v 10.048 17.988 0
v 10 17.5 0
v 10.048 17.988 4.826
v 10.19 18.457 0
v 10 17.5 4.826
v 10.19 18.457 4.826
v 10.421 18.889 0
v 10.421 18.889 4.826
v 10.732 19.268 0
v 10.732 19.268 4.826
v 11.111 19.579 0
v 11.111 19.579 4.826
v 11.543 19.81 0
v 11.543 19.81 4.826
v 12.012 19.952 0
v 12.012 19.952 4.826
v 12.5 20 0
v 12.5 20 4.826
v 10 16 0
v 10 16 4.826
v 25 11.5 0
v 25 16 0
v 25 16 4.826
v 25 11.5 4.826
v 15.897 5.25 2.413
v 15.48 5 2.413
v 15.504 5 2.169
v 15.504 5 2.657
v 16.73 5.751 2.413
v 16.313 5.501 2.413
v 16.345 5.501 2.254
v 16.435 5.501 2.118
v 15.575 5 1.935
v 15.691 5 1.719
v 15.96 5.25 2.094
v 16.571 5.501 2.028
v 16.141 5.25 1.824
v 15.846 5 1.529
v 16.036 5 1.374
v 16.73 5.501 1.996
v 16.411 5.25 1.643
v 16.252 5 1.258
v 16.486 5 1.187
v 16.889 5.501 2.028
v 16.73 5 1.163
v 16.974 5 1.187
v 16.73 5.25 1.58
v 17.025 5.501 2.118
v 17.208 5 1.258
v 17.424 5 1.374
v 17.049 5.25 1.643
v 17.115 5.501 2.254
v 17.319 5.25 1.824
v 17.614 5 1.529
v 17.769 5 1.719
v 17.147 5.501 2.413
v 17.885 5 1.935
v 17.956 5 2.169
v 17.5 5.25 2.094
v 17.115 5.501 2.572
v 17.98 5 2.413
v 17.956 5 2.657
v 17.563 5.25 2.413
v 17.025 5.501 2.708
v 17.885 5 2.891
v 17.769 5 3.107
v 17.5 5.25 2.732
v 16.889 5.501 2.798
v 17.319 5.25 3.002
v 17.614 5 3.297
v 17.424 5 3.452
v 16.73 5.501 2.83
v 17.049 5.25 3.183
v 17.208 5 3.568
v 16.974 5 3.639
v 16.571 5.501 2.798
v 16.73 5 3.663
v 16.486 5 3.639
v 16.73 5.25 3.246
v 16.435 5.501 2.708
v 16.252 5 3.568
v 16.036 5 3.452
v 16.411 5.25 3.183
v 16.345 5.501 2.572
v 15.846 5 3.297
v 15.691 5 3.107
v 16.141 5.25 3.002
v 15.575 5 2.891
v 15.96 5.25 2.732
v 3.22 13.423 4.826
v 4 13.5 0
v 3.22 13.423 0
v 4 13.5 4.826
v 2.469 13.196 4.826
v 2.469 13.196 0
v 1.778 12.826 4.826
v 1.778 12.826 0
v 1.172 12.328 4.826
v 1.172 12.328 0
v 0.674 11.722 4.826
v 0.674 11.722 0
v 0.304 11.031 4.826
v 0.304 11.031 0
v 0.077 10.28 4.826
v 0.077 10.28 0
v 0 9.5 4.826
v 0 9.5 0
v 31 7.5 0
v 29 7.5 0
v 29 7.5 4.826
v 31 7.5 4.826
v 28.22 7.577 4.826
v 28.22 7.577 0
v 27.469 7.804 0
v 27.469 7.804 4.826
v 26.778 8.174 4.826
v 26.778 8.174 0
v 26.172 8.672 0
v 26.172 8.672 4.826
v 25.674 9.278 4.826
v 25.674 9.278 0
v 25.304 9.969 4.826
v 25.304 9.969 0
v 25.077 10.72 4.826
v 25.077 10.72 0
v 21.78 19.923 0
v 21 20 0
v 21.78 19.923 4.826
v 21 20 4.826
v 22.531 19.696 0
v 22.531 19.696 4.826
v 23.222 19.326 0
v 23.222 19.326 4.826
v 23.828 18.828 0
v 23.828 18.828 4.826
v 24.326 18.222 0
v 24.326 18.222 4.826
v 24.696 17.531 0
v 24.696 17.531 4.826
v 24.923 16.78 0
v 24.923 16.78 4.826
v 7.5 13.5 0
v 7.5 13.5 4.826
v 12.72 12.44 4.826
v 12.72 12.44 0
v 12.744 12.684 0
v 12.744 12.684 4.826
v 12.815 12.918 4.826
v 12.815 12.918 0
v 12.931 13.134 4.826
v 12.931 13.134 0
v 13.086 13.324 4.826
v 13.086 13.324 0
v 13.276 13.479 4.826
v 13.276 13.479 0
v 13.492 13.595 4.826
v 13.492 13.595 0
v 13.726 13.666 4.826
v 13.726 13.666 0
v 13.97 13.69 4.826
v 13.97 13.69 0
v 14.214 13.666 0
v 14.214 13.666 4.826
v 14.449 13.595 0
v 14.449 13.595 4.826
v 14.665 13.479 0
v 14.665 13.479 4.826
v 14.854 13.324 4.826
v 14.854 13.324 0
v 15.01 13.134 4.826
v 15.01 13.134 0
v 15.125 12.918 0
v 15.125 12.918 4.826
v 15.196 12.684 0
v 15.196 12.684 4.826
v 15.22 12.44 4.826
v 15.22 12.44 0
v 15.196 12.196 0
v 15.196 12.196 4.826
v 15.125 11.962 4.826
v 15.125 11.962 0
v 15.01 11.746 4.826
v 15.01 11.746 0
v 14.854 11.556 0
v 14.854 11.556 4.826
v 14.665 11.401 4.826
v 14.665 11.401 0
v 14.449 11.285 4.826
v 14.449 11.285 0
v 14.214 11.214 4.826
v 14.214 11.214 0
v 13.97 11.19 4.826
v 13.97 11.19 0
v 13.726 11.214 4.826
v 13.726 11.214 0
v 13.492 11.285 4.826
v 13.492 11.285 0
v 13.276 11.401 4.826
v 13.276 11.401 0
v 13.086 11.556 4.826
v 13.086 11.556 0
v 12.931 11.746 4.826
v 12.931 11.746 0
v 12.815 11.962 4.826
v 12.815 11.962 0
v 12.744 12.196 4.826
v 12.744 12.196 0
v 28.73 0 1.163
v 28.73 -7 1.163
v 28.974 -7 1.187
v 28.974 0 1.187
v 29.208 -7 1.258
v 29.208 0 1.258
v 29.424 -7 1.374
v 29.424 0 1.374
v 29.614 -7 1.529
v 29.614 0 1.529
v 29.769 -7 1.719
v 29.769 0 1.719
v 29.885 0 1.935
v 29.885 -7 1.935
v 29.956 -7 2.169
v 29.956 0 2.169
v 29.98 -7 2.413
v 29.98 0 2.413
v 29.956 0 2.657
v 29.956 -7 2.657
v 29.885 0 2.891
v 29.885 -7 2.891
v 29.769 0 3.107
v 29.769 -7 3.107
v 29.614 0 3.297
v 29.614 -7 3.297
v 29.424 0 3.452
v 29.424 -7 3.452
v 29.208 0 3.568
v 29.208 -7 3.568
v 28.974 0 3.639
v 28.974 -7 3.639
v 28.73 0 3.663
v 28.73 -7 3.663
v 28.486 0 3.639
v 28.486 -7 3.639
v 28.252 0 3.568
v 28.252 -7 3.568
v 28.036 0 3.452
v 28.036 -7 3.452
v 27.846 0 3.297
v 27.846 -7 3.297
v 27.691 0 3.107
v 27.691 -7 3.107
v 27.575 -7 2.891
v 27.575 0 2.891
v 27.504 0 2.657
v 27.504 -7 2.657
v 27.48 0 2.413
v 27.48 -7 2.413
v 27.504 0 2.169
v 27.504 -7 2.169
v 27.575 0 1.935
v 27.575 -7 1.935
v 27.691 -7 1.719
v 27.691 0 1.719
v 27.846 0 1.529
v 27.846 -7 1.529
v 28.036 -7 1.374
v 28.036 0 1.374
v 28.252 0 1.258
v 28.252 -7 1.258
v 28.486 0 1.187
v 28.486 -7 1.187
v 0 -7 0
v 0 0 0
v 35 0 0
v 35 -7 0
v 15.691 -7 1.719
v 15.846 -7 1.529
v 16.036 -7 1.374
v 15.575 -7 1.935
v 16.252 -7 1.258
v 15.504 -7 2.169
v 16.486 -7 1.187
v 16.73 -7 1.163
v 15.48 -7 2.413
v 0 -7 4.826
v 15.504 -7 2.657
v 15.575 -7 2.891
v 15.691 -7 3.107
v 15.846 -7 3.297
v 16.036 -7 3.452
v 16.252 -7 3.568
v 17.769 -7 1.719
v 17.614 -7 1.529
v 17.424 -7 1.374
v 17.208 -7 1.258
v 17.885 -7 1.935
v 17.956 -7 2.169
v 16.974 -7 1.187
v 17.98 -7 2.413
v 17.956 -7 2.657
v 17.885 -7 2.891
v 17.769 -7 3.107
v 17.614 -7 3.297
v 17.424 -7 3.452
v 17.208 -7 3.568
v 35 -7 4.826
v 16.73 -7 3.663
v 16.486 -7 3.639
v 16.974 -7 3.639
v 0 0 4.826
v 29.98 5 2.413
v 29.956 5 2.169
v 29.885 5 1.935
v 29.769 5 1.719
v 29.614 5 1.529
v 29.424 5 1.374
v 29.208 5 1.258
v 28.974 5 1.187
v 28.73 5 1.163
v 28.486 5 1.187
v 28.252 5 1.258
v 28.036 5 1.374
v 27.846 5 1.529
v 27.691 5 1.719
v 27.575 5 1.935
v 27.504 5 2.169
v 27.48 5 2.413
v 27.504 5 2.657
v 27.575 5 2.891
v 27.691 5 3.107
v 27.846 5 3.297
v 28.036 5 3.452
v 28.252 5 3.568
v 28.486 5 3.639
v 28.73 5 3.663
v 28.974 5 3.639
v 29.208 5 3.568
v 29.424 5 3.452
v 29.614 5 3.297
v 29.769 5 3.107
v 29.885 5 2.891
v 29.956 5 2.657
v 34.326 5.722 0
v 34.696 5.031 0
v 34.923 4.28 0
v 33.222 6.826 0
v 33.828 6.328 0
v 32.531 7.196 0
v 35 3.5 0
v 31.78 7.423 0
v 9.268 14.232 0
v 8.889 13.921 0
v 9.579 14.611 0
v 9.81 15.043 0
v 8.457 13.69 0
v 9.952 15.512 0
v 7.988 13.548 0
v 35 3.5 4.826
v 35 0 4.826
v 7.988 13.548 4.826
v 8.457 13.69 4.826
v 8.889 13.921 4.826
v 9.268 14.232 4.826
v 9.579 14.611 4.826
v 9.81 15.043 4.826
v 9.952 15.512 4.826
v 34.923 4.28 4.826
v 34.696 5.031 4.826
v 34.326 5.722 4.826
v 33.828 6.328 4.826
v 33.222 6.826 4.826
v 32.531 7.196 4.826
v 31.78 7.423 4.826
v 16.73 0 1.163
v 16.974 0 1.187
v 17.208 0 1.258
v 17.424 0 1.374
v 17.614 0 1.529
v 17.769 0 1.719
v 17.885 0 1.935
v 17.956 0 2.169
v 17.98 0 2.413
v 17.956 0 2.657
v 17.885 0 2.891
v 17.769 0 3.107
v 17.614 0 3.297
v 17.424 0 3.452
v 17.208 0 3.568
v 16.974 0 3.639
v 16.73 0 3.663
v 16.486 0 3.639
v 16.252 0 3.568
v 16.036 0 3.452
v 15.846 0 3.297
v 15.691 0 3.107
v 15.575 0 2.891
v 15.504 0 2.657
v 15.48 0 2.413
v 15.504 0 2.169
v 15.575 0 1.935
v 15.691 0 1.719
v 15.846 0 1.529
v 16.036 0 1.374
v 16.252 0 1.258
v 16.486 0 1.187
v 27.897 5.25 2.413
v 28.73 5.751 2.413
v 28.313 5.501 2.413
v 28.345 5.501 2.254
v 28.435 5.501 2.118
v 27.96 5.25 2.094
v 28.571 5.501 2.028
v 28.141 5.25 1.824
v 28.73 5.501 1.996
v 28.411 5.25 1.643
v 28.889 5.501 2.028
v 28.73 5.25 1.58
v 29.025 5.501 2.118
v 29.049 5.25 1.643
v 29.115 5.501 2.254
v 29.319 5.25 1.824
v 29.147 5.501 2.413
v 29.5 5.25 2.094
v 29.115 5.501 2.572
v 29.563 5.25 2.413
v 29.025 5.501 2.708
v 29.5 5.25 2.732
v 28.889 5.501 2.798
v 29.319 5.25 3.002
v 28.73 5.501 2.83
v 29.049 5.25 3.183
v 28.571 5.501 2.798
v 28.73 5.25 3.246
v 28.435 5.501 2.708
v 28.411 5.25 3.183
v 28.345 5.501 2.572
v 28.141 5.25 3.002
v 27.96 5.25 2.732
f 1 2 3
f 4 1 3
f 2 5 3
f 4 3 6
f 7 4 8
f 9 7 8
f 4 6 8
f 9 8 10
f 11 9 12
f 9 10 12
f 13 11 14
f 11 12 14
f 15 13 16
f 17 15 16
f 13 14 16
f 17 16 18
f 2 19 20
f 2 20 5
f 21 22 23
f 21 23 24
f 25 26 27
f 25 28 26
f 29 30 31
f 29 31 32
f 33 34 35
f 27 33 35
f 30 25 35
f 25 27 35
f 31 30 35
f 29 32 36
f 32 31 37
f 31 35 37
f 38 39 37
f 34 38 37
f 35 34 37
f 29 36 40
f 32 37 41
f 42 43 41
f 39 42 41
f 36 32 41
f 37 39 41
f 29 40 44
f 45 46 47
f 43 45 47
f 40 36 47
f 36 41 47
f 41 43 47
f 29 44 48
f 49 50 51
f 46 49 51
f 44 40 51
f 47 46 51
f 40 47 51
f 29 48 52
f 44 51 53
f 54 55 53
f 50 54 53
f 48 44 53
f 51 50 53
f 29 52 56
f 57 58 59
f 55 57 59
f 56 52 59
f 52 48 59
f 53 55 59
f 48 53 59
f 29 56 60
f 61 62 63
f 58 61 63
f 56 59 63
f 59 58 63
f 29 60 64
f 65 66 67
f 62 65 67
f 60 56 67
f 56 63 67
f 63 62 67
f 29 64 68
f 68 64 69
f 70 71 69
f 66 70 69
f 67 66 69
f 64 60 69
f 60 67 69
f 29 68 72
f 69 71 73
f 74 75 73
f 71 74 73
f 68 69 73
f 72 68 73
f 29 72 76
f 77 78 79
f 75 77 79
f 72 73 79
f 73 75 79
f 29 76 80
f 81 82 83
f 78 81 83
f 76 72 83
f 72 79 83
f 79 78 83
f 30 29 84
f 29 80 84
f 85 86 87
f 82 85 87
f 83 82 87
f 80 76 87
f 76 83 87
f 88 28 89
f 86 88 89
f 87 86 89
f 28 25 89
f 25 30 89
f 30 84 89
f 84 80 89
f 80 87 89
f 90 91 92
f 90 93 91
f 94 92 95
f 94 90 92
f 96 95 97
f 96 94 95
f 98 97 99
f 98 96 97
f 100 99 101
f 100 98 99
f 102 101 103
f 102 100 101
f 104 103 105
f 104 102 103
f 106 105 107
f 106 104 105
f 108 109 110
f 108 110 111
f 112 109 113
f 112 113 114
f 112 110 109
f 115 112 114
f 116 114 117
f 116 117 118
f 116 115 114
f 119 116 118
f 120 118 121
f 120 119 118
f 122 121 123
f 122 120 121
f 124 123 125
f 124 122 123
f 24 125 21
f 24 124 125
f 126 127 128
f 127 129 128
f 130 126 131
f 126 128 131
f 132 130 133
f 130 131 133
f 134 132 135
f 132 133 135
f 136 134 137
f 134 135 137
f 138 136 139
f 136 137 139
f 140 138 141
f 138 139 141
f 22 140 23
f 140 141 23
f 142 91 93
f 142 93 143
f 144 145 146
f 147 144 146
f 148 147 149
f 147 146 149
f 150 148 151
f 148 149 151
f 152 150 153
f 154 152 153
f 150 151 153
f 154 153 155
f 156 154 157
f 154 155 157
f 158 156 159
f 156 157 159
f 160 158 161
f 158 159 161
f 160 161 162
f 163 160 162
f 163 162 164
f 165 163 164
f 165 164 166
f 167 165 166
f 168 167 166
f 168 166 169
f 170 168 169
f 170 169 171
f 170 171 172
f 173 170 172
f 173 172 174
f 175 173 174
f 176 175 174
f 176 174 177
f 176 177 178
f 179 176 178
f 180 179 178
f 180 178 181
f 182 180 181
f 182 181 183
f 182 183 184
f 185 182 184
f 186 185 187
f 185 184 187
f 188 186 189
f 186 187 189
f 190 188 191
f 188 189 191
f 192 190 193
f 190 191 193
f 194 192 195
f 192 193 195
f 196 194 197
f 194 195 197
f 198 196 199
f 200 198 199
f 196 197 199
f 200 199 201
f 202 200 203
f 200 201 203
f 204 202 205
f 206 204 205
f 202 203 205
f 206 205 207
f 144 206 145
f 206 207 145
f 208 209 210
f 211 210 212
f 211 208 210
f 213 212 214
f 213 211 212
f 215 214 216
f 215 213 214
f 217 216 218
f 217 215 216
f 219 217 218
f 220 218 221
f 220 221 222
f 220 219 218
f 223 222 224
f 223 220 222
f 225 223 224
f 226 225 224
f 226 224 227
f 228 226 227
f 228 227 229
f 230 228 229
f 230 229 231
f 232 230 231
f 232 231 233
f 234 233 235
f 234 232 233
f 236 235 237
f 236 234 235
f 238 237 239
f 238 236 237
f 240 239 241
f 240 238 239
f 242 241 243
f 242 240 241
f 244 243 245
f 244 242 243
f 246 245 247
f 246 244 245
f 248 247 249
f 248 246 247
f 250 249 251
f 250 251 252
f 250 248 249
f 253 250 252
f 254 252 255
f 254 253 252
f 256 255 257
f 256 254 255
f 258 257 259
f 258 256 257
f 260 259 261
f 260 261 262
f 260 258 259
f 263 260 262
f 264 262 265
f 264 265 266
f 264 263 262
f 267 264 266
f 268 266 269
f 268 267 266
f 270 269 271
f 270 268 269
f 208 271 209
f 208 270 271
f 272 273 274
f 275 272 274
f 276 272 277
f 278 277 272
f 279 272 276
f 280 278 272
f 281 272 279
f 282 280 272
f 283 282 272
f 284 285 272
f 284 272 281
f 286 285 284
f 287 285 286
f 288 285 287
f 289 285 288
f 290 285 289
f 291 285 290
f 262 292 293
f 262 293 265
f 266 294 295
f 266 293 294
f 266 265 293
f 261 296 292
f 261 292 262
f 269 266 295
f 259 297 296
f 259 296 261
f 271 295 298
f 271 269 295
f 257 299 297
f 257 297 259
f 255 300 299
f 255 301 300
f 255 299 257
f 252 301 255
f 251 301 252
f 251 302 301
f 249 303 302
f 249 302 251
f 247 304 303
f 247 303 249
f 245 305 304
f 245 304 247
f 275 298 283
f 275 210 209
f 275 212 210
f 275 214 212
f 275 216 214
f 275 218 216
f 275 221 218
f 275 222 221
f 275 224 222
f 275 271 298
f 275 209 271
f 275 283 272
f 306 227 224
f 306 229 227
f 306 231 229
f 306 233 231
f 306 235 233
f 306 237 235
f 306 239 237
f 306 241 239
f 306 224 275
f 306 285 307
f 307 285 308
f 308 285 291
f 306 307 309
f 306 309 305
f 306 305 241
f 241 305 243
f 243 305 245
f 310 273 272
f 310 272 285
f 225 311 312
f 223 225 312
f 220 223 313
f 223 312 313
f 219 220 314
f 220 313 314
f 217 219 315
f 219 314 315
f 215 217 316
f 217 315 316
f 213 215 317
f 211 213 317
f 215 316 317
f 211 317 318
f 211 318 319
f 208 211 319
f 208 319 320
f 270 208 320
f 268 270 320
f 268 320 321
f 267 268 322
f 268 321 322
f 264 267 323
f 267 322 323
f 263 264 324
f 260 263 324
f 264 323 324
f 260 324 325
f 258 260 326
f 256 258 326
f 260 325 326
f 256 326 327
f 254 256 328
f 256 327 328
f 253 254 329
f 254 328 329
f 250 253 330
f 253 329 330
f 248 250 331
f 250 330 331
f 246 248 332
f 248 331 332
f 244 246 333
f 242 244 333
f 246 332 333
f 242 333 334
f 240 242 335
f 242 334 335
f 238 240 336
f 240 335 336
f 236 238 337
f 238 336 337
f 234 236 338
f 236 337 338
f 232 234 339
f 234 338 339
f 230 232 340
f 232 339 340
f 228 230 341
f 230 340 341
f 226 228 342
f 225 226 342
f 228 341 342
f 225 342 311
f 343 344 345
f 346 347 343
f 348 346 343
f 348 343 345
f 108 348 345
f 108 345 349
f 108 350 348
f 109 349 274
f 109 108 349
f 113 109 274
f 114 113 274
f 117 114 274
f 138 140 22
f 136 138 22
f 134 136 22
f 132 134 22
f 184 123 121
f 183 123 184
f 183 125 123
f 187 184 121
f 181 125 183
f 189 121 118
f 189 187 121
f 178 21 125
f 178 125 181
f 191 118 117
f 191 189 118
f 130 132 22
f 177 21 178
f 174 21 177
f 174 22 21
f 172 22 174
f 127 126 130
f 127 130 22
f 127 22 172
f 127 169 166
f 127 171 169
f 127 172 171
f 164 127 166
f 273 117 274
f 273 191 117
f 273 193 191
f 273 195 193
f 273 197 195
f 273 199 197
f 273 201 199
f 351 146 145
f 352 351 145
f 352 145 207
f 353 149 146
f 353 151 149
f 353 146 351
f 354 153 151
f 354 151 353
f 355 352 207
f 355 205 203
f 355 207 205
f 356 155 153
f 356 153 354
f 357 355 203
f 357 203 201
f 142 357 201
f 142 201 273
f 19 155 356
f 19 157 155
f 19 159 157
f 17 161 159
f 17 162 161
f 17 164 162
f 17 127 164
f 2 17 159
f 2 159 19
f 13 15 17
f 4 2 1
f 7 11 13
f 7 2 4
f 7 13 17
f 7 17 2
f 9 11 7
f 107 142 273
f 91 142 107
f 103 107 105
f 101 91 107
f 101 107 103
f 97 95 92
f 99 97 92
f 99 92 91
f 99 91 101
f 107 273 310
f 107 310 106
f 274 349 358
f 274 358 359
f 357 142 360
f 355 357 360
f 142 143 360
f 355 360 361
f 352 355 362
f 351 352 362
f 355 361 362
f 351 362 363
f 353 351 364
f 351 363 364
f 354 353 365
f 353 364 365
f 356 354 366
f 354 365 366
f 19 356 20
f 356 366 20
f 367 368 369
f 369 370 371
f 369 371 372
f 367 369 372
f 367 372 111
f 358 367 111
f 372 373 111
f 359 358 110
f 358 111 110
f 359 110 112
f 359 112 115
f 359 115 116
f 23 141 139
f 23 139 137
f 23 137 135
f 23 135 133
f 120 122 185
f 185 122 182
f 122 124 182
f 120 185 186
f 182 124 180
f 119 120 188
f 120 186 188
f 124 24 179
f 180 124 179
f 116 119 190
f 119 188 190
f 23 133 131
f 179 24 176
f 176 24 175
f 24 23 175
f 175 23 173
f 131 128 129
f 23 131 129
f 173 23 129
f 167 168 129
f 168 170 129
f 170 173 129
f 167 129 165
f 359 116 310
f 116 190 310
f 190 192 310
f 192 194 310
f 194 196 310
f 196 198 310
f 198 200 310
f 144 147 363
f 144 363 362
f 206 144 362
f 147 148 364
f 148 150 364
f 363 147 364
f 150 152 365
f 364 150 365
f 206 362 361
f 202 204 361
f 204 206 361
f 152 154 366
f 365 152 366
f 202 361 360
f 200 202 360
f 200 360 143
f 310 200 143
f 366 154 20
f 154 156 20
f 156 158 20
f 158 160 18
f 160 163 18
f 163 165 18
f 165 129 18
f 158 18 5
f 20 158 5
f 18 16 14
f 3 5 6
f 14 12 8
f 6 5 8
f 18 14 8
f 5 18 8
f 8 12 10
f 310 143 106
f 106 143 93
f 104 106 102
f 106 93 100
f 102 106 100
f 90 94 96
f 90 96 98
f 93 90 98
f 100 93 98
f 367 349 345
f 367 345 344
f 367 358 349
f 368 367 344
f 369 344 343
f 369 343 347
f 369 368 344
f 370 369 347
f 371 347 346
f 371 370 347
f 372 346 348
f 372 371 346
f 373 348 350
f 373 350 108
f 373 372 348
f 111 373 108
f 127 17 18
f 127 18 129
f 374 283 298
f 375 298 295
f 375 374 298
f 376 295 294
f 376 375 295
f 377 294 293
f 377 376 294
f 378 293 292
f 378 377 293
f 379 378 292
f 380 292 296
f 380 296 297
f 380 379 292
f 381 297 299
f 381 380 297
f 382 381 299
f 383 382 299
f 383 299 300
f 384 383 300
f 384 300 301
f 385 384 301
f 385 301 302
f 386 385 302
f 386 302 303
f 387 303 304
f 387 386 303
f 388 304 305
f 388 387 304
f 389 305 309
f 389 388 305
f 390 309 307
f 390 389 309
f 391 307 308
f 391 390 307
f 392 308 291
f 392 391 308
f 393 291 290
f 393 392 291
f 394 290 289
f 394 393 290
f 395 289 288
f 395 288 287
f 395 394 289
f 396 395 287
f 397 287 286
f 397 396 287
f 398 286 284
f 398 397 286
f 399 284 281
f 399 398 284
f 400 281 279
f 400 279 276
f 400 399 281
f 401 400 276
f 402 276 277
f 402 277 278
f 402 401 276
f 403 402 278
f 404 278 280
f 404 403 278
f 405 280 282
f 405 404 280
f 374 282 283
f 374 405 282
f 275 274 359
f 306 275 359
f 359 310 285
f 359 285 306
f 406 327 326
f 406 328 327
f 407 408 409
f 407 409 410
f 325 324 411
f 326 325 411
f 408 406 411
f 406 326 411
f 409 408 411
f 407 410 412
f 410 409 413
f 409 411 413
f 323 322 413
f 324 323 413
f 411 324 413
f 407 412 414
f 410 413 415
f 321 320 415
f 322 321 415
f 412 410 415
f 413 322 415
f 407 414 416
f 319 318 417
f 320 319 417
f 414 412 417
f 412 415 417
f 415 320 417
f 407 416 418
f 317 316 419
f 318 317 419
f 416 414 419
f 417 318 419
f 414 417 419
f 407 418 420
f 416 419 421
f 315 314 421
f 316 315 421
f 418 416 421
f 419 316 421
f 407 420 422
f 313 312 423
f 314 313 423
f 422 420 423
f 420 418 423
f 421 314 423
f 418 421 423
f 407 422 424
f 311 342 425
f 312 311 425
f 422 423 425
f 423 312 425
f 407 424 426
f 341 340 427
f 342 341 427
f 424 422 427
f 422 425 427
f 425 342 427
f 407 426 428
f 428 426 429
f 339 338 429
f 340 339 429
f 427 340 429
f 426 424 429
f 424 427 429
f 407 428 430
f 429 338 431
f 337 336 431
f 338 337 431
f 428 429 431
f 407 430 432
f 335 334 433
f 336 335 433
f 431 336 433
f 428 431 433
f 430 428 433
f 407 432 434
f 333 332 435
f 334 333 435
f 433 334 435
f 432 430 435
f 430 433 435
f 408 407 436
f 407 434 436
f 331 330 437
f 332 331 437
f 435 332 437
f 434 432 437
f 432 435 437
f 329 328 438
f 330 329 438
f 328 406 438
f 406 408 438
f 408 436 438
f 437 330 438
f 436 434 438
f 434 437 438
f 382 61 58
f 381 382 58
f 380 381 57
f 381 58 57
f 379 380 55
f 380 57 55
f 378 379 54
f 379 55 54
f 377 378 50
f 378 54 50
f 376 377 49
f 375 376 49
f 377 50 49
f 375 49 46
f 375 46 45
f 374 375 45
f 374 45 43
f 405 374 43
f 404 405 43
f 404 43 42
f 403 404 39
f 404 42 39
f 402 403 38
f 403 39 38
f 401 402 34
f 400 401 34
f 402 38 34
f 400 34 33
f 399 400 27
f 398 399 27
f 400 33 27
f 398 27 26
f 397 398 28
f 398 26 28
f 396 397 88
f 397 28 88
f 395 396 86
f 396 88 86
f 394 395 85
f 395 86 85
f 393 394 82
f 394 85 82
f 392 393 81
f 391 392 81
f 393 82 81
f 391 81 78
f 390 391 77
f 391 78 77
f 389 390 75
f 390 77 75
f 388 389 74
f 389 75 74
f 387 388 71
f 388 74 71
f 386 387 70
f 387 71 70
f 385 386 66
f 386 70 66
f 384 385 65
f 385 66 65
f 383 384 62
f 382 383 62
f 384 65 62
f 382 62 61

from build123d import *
from build123d.topology import SkipClean

# Parameters (mm, degrees)
BOSS_EXTRUDE1_DEPTH       = 4.826
M3X0_5_TAPPED_HOLE2_D     = 2.5
M3X0_5_TAPPED_HOLE3_D     = 2.5
M3X0_5_TAPPED_HOLE3_DEPTH = 5
M3X0_5_TAPPED_HOLE3_TIP   = 0.751075774
FILLET1_R                 = 2.5
FILLET2_R                 = 4
SKETCH20_W                = 35
SKETCH20_H                = 4.826
SKETCH20_R                = 1.25
BOSS_EXTRUDE2_DEPTH       = 7


with BuildPart() as part:
    # Sketch1 → Boss-Extrude1 (new body)
    with BuildSketch(Plane.XY):
        Polygon((0, 0), (0, 13.5), (10, 13.5), (10, 20), (25, 20), (25, 7.5), (35, 7.5), (35, 0), align=None)
    extrude(amount=BOSS_EXTRUDE1_DEPTH)

    # M3x0.5 Tapped Hole2 (through all)
    with Locations(Plane.XY.offset(4.826)):
        with Locations((13.97024649, 12.44)):
            Hole(M3X0_5_TAPPED_HOLE2_D / 2)

    # M3x0.5 Tapped Hole3
    with Locations(Plane(origin=(0, 0, 0), x_dir=(-1, 0, 0), z_dir=(0, -1, 0))):
        with Locations((-16.73, -2.413), (-28.73, -2.413)):
            Hole(M3X0_5_TAPPED_HOLE3_D / 2, depth=M3X0_5_TAPPED_HOLE3_DEPTH)
            with Locations((0, 0, -(M3X0_5_TAPPED_HOLE3_DEPTH + M3X0_5_TAPPED_HOLE3_TIP / 2))):  # 118° drill point
                Cone(0, M3X0_5_TAPPED_HOLE3_D / 2, M3X0_5_TAPPED_HOLE3_TIP, mode=Mode.SUBTRACT)

    # Fillet1
    fillet1_edges = [part.edges().sort_by_distance(p)[0] for p in [
        (10, 20, 2.413),
        (10, 13.5, 2.413),
    ]]
    fillet(fillet1_edges, radius=FILLET1_R)

    # Fillet2
    fillet2_edges = [part.edges().sort_by_distance(p)[0] for p in [
        (25, 20, 2.413),
        (25, 7.5, 2.413),
        (35, 7.5, 2.413),
        (0, 13.5, 2.413),
    ]]
    fillet(fillet2_edges, radius=FILLET2_R)

    # Sketch20 → Boss-Extrude2 (add)
    with SkipClean():  # the faces are left unmerged after this step: merging them gives an invalid solid
        with BuildSketch(Plane.XZ):
            with Locations((17.5, 2.413)):
                Rectangle(SKETCH20_W, SKETCH20_H)
            with Locations(Location((28.73, 2.413, 0), (0, 0, 270))):
                Circle(SKETCH20_R, mode=Mode.SUBTRACT)
            with Locations(Location((16.73, 2.413, 0), (0, 0, 270))):
                Circle(SKETCH20_R, mode=Mode.SUBTRACT)
        extrude(amount=BOSS_EXTRUDE2_DEPTH)


solid = part.part
